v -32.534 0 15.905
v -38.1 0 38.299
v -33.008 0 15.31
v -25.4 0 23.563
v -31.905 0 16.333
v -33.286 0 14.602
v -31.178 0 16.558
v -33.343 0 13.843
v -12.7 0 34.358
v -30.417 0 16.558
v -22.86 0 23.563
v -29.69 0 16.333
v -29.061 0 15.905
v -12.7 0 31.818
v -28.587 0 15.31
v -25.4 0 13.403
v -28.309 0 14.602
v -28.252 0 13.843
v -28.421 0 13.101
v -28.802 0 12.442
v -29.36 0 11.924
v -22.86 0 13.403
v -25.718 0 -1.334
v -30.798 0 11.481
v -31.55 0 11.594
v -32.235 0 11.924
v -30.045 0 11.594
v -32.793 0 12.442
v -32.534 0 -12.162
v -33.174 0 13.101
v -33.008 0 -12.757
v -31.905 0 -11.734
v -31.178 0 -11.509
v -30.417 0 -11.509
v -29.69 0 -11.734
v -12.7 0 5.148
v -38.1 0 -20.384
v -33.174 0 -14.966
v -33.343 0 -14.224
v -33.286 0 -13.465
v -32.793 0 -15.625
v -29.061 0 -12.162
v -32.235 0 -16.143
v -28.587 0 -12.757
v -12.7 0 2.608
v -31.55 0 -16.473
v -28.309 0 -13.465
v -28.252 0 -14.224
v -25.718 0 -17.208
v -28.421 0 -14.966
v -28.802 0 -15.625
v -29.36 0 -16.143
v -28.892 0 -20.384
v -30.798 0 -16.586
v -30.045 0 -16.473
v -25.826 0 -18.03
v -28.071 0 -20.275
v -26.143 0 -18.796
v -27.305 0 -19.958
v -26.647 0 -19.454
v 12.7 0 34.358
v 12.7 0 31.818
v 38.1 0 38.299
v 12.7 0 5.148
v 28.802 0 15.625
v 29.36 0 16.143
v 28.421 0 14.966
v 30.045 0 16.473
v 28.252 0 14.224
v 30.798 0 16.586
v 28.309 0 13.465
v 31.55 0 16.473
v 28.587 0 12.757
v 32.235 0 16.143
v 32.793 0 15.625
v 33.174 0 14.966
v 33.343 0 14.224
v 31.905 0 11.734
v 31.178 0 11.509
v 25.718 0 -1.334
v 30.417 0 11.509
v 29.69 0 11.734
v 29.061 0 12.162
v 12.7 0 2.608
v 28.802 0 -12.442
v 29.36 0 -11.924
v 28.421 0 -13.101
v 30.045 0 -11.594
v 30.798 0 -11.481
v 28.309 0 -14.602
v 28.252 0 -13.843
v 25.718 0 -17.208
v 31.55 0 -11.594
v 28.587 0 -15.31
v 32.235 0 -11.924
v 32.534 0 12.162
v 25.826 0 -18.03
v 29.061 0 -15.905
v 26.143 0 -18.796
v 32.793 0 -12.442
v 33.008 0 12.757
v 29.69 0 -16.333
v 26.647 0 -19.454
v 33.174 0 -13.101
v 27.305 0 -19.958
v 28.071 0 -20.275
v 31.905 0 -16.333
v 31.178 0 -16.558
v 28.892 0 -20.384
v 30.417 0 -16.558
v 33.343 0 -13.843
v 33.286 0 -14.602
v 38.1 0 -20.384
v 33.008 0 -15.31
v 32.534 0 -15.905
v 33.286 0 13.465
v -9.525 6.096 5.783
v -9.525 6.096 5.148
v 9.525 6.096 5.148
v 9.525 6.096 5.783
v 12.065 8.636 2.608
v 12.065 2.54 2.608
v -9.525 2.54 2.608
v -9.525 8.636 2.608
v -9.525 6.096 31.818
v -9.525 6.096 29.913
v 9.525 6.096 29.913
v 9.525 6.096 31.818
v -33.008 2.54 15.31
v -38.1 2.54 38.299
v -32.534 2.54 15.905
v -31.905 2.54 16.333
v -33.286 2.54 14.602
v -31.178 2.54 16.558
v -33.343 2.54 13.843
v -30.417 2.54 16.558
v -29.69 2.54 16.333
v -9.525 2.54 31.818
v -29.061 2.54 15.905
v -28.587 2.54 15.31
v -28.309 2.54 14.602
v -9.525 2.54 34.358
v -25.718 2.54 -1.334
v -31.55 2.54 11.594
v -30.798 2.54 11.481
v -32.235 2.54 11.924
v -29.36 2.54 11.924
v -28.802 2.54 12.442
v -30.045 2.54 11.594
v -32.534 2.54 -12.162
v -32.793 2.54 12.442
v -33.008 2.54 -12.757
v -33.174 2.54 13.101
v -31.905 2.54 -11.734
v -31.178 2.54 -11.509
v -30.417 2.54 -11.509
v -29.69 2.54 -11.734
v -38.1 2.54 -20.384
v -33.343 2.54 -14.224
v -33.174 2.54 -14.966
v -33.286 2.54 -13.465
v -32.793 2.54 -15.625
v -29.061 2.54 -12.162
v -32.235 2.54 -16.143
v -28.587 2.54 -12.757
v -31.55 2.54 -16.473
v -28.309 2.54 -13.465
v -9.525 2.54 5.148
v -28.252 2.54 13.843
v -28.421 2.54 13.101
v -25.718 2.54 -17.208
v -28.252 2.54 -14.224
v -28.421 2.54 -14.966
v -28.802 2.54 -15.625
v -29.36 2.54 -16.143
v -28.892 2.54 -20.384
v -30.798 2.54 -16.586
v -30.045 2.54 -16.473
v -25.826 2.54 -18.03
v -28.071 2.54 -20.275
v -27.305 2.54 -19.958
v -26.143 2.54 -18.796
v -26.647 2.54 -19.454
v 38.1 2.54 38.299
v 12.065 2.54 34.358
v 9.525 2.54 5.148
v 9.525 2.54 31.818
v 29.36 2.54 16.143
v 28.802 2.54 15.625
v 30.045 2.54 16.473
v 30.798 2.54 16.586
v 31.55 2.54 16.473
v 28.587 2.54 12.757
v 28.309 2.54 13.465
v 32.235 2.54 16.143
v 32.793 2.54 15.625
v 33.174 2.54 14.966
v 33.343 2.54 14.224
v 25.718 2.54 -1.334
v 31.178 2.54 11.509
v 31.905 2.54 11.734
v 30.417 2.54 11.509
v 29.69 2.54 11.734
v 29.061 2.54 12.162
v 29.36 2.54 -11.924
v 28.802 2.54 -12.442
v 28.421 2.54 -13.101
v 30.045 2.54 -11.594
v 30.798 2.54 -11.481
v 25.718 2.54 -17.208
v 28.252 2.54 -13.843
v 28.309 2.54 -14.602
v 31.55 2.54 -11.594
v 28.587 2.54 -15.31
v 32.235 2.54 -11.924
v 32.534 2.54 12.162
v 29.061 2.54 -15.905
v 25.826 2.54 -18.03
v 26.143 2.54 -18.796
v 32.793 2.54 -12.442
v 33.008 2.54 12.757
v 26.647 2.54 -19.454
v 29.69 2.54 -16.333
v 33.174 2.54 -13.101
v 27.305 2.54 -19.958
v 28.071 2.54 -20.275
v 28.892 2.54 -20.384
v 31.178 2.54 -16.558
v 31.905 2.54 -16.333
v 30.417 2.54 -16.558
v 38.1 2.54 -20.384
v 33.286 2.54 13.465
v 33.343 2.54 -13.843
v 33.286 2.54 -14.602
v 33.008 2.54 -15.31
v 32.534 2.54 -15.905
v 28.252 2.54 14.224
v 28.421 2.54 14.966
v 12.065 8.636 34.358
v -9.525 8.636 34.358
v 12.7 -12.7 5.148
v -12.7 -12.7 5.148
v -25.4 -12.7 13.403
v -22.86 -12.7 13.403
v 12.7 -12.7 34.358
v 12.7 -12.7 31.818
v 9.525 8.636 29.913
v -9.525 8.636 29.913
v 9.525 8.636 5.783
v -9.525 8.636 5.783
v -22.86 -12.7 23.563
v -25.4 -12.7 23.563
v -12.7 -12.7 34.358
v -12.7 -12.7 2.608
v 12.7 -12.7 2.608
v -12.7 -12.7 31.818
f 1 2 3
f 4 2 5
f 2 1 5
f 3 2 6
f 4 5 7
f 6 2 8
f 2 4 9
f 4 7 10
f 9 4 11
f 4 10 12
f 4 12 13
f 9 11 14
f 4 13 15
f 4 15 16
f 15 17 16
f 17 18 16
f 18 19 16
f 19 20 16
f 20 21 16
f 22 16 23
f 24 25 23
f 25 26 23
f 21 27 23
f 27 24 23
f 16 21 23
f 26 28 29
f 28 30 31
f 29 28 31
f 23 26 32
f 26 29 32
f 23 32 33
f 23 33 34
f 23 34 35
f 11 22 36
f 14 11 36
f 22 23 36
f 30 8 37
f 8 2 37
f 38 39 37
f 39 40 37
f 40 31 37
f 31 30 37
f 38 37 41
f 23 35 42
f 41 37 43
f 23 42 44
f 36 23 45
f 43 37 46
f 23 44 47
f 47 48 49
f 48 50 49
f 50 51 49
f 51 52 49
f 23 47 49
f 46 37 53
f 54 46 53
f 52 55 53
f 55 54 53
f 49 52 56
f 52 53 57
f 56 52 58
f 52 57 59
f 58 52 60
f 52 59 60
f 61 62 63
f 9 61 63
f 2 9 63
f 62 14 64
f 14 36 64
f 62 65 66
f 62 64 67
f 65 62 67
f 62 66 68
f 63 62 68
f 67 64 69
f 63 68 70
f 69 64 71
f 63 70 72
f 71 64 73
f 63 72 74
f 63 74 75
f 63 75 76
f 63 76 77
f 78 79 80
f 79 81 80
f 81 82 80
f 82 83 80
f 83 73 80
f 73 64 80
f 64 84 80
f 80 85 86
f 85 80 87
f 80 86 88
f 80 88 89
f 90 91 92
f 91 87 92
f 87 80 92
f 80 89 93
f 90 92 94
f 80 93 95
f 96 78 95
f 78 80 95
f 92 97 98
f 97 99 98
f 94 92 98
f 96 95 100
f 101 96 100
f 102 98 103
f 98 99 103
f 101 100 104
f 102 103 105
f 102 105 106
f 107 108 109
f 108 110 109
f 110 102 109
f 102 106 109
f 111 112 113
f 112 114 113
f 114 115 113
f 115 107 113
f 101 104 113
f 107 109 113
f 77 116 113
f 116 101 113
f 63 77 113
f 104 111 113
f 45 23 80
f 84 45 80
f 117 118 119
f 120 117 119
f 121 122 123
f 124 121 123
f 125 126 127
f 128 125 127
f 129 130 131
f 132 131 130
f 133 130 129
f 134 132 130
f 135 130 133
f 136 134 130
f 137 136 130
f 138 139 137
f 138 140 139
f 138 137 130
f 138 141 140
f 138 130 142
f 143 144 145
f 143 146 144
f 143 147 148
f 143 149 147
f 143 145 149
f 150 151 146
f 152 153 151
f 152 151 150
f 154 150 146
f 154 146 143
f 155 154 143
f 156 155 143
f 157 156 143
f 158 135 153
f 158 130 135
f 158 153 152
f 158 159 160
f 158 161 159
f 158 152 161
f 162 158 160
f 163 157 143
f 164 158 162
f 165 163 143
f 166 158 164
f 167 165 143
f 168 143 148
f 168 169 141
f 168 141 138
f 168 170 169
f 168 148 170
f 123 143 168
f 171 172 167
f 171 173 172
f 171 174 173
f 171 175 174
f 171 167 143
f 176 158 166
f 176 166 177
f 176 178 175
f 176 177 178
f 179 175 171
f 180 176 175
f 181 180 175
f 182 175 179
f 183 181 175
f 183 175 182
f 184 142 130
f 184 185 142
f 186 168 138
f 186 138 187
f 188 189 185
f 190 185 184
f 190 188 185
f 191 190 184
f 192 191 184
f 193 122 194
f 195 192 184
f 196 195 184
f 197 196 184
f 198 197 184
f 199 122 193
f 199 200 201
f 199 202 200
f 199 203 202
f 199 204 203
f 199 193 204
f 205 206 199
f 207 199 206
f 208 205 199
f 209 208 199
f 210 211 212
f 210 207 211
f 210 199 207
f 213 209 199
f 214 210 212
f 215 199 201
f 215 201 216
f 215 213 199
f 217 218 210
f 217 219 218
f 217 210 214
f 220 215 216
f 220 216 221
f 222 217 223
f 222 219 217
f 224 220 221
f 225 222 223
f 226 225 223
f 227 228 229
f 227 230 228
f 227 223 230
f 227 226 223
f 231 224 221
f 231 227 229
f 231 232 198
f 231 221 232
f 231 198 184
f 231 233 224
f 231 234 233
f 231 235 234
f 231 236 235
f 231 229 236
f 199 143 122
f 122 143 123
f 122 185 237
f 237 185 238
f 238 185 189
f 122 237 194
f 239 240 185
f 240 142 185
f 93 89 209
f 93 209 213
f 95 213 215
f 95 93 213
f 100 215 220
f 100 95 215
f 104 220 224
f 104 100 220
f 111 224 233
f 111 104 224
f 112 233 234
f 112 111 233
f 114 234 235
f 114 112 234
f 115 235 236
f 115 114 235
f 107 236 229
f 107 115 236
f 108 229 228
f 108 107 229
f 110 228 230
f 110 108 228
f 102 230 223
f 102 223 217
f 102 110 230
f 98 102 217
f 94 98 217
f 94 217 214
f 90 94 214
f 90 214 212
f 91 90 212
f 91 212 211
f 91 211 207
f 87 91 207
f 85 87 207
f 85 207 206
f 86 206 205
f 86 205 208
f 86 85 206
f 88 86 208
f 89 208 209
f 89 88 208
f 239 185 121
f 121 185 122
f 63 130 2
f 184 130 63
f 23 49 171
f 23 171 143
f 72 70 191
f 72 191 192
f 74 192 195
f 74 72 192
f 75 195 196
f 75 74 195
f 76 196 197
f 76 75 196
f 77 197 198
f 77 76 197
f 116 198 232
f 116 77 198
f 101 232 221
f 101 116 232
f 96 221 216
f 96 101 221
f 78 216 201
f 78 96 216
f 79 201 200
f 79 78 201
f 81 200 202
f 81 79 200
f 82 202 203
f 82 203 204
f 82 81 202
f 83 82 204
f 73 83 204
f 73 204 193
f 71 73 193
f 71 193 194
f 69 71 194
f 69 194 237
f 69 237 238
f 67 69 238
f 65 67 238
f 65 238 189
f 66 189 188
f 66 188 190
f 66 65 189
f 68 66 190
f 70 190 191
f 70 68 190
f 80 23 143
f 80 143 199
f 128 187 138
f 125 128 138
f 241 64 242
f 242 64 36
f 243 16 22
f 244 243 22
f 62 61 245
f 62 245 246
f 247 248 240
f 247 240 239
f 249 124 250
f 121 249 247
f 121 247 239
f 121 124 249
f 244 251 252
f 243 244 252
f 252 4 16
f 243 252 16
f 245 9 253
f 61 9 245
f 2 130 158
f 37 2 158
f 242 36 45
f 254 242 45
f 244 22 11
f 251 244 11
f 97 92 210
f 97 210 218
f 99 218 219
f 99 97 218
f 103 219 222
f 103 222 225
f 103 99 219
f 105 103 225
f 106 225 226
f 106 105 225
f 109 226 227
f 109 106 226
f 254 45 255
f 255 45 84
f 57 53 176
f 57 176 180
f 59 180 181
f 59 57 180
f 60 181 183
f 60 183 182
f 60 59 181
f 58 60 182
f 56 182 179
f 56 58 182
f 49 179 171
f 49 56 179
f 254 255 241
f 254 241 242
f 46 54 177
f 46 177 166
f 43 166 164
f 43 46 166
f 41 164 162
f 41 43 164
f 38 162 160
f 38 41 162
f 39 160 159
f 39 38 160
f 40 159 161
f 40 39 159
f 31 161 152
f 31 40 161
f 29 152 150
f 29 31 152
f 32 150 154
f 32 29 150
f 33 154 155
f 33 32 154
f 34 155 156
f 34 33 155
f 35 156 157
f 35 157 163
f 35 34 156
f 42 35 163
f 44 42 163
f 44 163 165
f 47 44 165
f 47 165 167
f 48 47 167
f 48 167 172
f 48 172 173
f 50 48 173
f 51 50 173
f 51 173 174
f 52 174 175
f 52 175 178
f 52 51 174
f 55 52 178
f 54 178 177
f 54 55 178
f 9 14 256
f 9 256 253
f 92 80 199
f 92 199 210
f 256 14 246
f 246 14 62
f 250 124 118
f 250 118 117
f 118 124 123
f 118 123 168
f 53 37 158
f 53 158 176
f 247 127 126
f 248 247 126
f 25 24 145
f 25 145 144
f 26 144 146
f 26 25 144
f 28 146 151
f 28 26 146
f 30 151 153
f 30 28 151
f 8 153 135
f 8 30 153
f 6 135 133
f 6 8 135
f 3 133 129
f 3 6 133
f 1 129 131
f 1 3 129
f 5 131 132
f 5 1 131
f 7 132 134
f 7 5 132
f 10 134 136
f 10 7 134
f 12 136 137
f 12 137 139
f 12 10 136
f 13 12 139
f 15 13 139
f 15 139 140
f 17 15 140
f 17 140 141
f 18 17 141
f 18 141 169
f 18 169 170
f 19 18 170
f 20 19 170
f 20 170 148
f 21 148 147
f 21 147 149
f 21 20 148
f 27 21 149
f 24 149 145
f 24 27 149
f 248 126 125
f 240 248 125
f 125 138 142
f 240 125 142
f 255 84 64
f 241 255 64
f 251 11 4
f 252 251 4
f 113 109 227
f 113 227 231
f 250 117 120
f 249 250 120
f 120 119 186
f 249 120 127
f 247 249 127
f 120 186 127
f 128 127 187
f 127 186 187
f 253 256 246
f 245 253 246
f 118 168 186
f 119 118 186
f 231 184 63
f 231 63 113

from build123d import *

# Parameters (mm, degrees)
SKETCH1_R           = 2.5527
BOSS_EXTRUDE1_DEPTH = 2.54
SKETCH7_W           = 76.2
SKETCH7_H           = 17.915396906
BOSS_EXTRUDE5_DEPTH = 2.54
BOSS_EXTRUDE2_DEPTH = 3.556
SKETCH4_W           = 31.75
SKETCH4_H           = 3.556
CUT_EXTRUDE1_DEPTH  = 2.54
BOSS_EXTRUDE3_DEPTH = 2.54
BOSS_EXTRUDE4_DEPTH = 12.7


with BuildPart() as part:
    # Sketch1 → Boss-Extrude1 (new body)
    with BuildSketch(Plane(origin=(0, 0, 0), x_dir=(1, 0, 0), z_dir=(0, 1, 0))):
        with BuildLine():
            Line((38.1, -20.3835), (-38.1, -20.3835))
            Line((-38.1, -20.3835), (-38.1, 20.3835))
            Line((-38.1, 20.3835), (-28.8925, 20.3835))
            ThreePointArc((-28.8925, 20.3835), (-26.64743597, 19.45356403), (-25.7175, 17.2085))
            Line((-25.7175, 17.2085), (-25.7175, 1.3335))
            Line((-25.7175, 1.3335), (25.7175, 1.3335))
            Line((25.7175, 1.3335), (25.7175, 17.2085))
            ThreePointArc((25.7175, 17.2085), (26.64743597, 19.45356403), (28.8925, 20.3835))
            Line((28.8925, 20.3835), (38.1, 20.3835))
            Line((38.1, 20.3835), (38.1, -20.3835))
        make_face()
        with Locations(Location((30.7975, -14.0335, 0), (0, 0, 270))):
            Circle(SKETCH1_R, mode=Mode.SUBTRACT)
        with Locations(Location((30.7975, 14.0335, 0), (0, 0, 270))):
            Circle(SKETCH1_R, mode=Mode.SUBTRACT)
        with Locations(Location((-30.7975, -14.0335, 0), (0, 0, 90))):
            Circle(SKETCH1_R, mode=Mode.SUBTRACT)
        with Locations(Location((-30.7975, 14.0335, 0), (0, 0, 90))):
            Circle(SKETCH1_R, mode=Mode.SUBTRACT)
    extrude(amount=BOSS_EXTRUDE1_DEPTH)

    # Sketch7 → Boss-Extrude5 (add)
    with BuildSketch(Plane(origin=(0, 2.54, 0), x_dir=(1, 0, 0), z_dir=(0, 1, 0))):
        with Locations((0, -29.341198453)):
            Rectangle(SKETCH7_W, SKETCH7_H)
    extrude(amount=-BOSS_EXTRUDE5_DEPTH)

    # Sketch3 → Boss-Extrude2 (add)
    with BuildSketch(Plane(origin=(0, 2.54, 0), x_dir=(1, 0, 0), z_dir=(0, 1, 0))):
        Polygon((-12.065, -2.607698453), (-12.065, -5.147698453), (-9.525, -5.147698453), (9.525, -5.147698453), (9.525, -31.817698453), (-9.525, -31.817698453), (-12.065, -31.817698453), (-12.065, -34.357698453), (12.065, -34.357698453), (12.065, -2.607698453), align=None)
    extrude(amount=BOSS_EXTRUDE2_DEPTH)

    # Sketch4 → Cut-Extrude1 (cut)
    with BuildSketch(Plane.ZY.offset(12.065)):
        with Locations((18.482698453, 4.318)):
            Rectangle(SKETCH4_W, SKETCH4_H)
    extrude(amount=-CUT_EXTRUDE1_DEPTH, mode=Mode.SUBTRACT)

    # Sketch5 → Boss-Extrude3 (add)
    with BuildSketch(Plane(origin=(0, 6.096, 0), x_dir=(1, 0, 0), z_dir=(0, 1, 0))):
        Polygon((-9.525, -2.607698453), (-9.525, -5.782698453), (9.525, -5.782698453), (9.525, -29.912698453), (-9.525, -29.912698453), (-9.525, -34.357698453), (12.065, -34.357698453), (12.065, -2.607698453), align=None)
    extrude(amount=BOSS_EXTRUDE3_DEPTH)

    # Sketch6 → Boss-Extrude4 (add)
    with BuildSketch(Plane(origin=(0, 0, 0), x_dir=(-1, 0, 0), z_dir=(0, -1, 0))):
        Polygon((22.86, -13.402698453), (22.86, -18.482698453), (22.86, -23.562698453), (25.4, -23.562698453), (25.4, -13.402698453), align=None)
        Polygon((-12.7, -2.607698453), (-12.7, -5.147698453), (0, -5.147698453), (12.7, -5.147698453), (12.7, -2.607698453), align=None)
        Polygon((-12.7, -31.817698453), (0, -31.817698453), (12.7, -31.817698453), (12.7, -34.357698453), (-12.7, -34.357698453), align=None)
    extrude(amount=BOSS_EXTRUDE4_DEPTH)


solid = part.part
